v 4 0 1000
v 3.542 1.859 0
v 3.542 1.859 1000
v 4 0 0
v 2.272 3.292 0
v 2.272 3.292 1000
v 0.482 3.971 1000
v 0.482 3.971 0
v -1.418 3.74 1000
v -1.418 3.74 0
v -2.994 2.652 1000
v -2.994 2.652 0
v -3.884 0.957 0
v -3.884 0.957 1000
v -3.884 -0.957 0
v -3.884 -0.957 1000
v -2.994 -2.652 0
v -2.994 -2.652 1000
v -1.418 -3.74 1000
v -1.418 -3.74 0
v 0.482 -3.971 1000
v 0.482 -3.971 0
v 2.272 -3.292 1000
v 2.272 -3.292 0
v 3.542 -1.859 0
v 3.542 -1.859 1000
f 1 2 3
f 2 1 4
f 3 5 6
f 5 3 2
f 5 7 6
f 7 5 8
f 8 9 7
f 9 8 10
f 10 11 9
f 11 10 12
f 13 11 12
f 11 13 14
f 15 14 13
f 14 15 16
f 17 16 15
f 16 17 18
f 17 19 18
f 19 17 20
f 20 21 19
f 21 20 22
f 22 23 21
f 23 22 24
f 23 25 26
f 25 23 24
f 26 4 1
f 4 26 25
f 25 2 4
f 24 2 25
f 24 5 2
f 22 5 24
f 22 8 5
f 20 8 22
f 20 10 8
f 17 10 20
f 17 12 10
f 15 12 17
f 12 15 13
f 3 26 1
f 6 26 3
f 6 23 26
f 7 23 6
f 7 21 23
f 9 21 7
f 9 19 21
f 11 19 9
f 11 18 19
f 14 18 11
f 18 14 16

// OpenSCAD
function ZrodLength()=1000;
function ZrodDiameter()=8;  //base case: 8
function ZrodRadius()=ZrodDiameter()/2;

module Zrod()
{
color("Silver")
cylinder(ZrodLength(), ZrodRadius(), ZrodRadius());
}

Zrod();
